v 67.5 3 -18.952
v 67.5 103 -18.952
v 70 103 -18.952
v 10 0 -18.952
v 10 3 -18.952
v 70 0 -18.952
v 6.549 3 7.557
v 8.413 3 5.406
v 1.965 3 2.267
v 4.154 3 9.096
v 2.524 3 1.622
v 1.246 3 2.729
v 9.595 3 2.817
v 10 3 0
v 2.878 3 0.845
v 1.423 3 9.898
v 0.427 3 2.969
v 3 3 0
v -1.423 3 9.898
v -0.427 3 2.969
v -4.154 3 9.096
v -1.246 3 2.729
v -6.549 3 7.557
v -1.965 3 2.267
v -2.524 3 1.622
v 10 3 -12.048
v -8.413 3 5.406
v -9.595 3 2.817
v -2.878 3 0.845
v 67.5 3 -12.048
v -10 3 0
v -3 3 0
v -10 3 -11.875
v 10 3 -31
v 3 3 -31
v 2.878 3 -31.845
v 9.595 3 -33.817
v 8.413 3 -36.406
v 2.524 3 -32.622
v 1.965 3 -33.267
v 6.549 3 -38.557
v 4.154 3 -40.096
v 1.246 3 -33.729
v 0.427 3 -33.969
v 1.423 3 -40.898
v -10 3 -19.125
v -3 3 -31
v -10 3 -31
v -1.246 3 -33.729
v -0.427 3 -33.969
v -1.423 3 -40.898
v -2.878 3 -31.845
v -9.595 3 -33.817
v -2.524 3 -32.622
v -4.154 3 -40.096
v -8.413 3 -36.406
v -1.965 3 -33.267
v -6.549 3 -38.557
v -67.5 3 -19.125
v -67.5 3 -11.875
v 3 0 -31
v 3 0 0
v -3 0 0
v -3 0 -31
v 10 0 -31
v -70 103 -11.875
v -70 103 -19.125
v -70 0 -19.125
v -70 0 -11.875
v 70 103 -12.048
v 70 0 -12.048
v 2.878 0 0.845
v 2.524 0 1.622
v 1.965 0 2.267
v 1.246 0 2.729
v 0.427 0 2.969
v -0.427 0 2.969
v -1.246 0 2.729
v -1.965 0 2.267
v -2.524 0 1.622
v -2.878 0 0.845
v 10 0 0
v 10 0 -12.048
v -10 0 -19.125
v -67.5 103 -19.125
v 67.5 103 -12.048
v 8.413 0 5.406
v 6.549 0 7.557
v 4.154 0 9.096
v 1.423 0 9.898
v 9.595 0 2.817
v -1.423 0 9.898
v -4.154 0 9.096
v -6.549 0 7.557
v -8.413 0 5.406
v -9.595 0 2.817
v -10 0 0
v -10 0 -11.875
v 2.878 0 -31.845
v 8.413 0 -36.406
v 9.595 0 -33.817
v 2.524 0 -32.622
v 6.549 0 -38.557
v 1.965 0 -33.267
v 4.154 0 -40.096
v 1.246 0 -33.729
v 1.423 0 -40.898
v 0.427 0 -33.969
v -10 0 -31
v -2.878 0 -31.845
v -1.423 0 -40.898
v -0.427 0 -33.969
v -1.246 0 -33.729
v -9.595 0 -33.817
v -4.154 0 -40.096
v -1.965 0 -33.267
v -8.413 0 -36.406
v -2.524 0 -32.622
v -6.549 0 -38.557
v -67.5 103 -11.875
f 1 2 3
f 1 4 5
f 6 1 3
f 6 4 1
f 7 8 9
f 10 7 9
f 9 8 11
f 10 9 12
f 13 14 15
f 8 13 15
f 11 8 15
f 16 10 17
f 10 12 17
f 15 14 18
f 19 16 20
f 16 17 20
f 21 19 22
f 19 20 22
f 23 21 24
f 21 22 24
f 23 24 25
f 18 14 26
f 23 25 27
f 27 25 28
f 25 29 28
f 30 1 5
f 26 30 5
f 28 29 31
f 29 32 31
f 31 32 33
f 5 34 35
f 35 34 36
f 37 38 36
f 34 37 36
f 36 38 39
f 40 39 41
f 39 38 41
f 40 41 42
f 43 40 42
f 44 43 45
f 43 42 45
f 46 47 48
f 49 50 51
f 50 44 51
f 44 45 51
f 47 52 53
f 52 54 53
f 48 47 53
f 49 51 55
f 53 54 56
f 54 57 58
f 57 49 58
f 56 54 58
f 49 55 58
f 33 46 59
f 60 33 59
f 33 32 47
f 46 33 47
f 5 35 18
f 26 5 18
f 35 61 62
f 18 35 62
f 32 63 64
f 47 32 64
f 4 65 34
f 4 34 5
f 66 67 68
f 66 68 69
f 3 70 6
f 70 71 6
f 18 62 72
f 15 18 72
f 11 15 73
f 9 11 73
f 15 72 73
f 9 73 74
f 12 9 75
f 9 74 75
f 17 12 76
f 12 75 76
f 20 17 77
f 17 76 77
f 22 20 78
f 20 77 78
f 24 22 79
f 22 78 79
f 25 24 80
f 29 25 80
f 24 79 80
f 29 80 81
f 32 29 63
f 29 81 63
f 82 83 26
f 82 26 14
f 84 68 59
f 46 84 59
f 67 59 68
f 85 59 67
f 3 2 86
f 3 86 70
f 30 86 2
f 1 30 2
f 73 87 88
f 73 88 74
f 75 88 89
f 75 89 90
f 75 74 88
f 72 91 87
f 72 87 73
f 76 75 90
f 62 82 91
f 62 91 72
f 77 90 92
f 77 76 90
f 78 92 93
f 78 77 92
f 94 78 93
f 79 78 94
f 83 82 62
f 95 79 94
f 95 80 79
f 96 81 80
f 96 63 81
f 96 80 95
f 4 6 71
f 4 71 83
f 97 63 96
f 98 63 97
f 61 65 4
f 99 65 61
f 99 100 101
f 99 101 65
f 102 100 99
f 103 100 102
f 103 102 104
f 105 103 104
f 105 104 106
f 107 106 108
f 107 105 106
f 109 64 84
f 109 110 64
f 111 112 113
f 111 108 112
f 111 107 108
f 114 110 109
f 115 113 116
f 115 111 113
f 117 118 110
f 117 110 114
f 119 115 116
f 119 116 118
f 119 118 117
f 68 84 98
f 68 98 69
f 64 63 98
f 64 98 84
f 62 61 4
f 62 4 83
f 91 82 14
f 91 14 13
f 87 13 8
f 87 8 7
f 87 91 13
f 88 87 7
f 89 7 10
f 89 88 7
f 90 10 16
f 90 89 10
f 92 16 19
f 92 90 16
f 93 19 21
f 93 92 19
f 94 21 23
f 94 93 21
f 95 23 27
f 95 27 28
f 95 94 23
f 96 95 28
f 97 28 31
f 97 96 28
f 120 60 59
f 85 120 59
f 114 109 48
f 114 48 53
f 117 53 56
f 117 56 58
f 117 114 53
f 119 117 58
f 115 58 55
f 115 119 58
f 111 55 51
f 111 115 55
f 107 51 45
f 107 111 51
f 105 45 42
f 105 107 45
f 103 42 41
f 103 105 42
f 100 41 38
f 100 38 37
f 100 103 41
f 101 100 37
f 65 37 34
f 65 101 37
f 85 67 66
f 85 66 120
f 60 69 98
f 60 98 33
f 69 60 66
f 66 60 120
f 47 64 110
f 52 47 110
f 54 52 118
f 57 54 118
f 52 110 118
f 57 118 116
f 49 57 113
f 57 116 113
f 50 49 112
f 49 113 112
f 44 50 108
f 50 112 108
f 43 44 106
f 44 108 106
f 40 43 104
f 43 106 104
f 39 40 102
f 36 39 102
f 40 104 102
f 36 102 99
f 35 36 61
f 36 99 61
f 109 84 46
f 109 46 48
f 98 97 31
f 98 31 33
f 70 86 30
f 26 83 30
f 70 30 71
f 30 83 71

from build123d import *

# Parameters (mm, degrees)
BOSS_EXTRUDE1_DEPTH = 3
SKETCH2_W           = 6.903287468
SKETCH2_H           = 3
BOSS_EXTRUDE2_DEPTH = 60
SKETCH3_W           = 7.25
SKETCH3_H           = 3
BOSS_EXTRUDE3_DEPTH = 60
SKETCH4_W           = 2.5
SKETCH4_H           = 6.903287468
SKETCH4_H_2         = 7.25
BOSS_EXTRUDE4_DEPTH = 100


with BuildPart() as part:
    # Sketch1 → Boss-Extrude1 (new body)
    with BuildSketch(Plane(origin=(0, 0, 0), x_dir=(1, 0, 0), z_dir=(0, 1, 0))):
        with BuildLine():
            Line((10, 31), (10, 0))
            ThreePointArc((10, 0), (0, -10), (-10, 0))
            Line((-10, 0), (-10, 31))
            ThreePointArc((-10, 31), (0, 41), (10, 31))
        make_face()
        with BuildLine():
            Line((-3, 0), (-3, 31))
            ThreePointArc((-3, 31), (0, 34), (3, 31))
            Line((3, 31), (3, 0))
            ThreePointArc((3, 0), (0, -3), (-3, 0))
        make_face(mode=Mode.SUBTRACT)
    extrude(amount=BOSS_EXTRUDE1_DEPTH)

    # Sketch2 → Boss-Extrude2 (add)
    with BuildSketch(Plane(origin=(10, 0, 0), x_dir=(0, 0, -1), z_dir=(1, 0, 0))):
        with Locations((15.5, 1.5)):
            Rectangle(SKETCH2_W, SKETCH2_H)
    extrude(amount=BOSS_EXTRUDE2_DEPTH)

    # Sketch3 → Boss-Extrude3 (add)
    with BuildSketch(Plane.ZY.offset(10)):
        with Locations((-15.5, 1.5)):
            Rectangle(SKETCH3_W, SKETCH3_H)
    extrude(amount=BOSS_EXTRUDE3_DEPTH)

    # Sketch4 → Boss-Extrude4 (add)
    with BuildSketch(Plane(origin=(0, 3, 0), x_dir=(1, 0, 0), z_dir=(0, 1, 0))):
        with Locations((68.75, 15.5)):
            Rectangle(SKETCH4_W, SKETCH4_H)
        with Locations((-68.75, 15.5)):
            Rectangle(SKETCH4_W, SKETCH4_H_2)
    extrude(amount=BOSS_EXTRUDE4_DEPTH)


solid = part.part
